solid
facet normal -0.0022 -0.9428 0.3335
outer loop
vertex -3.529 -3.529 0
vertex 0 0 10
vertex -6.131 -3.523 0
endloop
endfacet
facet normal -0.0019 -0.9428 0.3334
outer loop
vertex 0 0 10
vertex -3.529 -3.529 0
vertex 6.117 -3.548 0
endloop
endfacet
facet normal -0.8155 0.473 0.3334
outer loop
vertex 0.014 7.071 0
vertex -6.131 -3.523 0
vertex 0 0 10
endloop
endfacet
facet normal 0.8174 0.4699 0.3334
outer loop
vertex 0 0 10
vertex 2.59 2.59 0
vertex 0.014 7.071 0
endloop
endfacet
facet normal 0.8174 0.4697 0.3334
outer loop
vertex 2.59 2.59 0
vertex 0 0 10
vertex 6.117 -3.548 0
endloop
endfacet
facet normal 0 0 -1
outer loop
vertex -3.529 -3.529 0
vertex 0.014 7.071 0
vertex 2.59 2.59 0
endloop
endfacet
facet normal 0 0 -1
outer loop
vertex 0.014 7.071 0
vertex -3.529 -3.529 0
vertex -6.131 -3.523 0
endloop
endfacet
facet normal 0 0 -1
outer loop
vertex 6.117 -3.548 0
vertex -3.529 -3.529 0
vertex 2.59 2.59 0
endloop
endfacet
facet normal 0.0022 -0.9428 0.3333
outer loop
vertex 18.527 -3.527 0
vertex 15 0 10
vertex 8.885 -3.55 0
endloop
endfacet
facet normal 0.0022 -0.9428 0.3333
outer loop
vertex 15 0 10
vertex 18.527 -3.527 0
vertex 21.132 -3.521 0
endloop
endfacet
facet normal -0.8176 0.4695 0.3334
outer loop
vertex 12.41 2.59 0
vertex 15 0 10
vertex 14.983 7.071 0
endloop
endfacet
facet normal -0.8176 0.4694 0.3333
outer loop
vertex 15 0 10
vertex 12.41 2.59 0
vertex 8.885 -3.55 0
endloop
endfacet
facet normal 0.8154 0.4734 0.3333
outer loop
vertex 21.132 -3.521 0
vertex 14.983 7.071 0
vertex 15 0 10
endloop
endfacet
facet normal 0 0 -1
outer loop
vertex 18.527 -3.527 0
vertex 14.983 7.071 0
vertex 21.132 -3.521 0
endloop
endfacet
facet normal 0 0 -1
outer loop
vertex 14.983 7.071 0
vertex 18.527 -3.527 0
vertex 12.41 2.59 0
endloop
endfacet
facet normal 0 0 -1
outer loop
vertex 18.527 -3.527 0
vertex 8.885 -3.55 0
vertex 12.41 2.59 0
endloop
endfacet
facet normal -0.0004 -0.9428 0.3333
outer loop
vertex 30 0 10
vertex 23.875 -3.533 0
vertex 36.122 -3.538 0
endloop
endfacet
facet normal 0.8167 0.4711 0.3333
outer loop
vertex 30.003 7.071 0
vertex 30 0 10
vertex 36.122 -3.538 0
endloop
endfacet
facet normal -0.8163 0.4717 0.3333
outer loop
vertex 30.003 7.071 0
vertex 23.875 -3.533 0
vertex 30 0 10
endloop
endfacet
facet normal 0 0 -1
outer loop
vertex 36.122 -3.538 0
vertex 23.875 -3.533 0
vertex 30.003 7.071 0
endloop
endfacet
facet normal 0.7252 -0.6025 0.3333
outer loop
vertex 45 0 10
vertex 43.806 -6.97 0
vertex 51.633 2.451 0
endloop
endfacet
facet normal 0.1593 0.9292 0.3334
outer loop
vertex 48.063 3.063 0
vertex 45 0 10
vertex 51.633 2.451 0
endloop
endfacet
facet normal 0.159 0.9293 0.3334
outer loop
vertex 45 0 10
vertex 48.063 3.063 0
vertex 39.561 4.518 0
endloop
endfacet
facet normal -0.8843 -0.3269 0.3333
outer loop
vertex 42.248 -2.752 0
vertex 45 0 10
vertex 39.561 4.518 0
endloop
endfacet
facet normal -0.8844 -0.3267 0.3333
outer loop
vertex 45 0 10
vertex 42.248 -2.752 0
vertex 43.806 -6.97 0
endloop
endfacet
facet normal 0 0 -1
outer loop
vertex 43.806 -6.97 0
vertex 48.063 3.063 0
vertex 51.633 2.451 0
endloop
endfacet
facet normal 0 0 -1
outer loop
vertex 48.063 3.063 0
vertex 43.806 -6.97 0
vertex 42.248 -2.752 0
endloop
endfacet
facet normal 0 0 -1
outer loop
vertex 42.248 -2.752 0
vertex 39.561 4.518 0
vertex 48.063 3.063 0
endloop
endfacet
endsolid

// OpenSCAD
// file: PolyhedronOutlinerLib.scad
//====================================
// Utility functions adapted from 
// http://www.thingiverse.com/thing:11071
//====================================

function VMAG(v) = sqrt(v[0]*v[0]+v[1]*v[1]+v[2]*v[2]); 

function LineRotations(v) = [ 
	atan2(sqrt(v[0]*v[0]+v[1]*v[1]), v[2]), 
	0, 
	atan2(v[1], v[0])+90];

function parseSeg(seg) = [ 
	seg[0], 
	LineRotations(seg[1]-seg[0]), 
	VMAG(seg[1]-seg[0])
	];


module PlaceLine(seg, r=1, l = 10, type=1) 
{
	smoothness = 16;
	diameter = r*2;
	side = sqrt((diameter*diameter)/2);

	params = parseSeg(seg);

	origin = params[0];
	rot = params[1];
	len = params[2];

	translate(origin)
	rotate(rot)
	{
		if (type == 1)
		{
			rotate([0,0, 360]) cylinder(r=r, h=len, $fn=smoothness);

		} 
		if (type == 2)
		{
			translate([0,0,l/2]) cube([r,r,l], center=true);
		} 
		if (type == 3)
		{
			cube([r,r,2*l], center=true);
		}
	}
}
// main file
/* based on three.js - STL loader test by aleeper. PR2 head from www.ros.org */
  
use <PolyhedronOutlinerLib.scad>forPrint=1; generateConnectors = 1; generateSticks=0 ;sR=1.5; sL = 6; cR=30; cL=10; *edge0_1(1); *vertex0(1);if (!forPrint) %mainShape(); if (generateConnectors && forPrint) union() {translate([0,0,0]) vertex0(1);translate([15,0,0]) vertex1(1);translate([30,0,0]) vertex2(1);translate([45,0,0]) vertex3(1);}translate([0,-18,0])if (generateSticks && forPrint) union() {translate([0,0,0]) edge0_1(1);translate([3.2,0,0]) edge0_2(1);translate([6.4,0,0]) edge0_3(1);translate([9.600000000000001,0,0]) edge1_2(1);translate([12.8,0,0]) edge1_3(1);translate([16,0,0]) edge2_3(1);}module vertexBase0() { intersection() { mainShape(); PlaceLine([[-17.251,-30.062,0.00642054],[-17.657609390412986,-30.7705658206549,-0.2809850389512841]],r=cR,l=cL,type=3) {} }}module vertexBase1() { intersection() { mainShape(); PlaceLine([[-17.4484,29.9377,-0.0181856],[-17.85966446037042,30.6433406393209,-0.3061718230286469]],r=cR,l=cL,type=3) {} }}module vertexBase2() { intersection() { mainShape(); PlaceLine([[34.6114,0.108853,-0.130494],[35.4271981204083,0.11141899265250169,-0.42112632326297167]],r=cR,l=cL,type=3) {} }}module vertexBase3() { intersection() { mainShape(); PlaceLine([[0.0880366,0.0153295,48.9423],[0.09011177947309683,0.015691901394191524,49.80832155811989]],r=cR,l=cL,type=3) {} }}module edge0_1(forPrint){if (forPrint) translate([0,0,3.0642116374666877]) rotate([90,0,0]) rotate([0,0,125.12702256247589]) rotate([-90.02349712186891,0,0]) rotate([0,0,-180.18850337698703]) translate(-[-17.251,-30.062,0.00642054]){intersection() { mainShape(); union(){difference(){PlaceLine([[-17.251,-30.062,0.00642054],[-17.4484,29.9377,-0.0181856]],r=sR,l=sL,type=0) {translate([0,0,7]) linear_extrude(height=46.00002976926034) rotate([0,0,-125.12702256247589])polygon([[0,1],[1,-0.41421163746668754],[1,-3.0642116374666877],[-1,-3.0642116374666877],[-1,-0.41421163746668754]]);} vertexBase0();vertexBase1();}PlaceLine([[-17.251,-30.062,0.00642054],[-17.4484,29.9377,-0.0181856]],r=sR,l=sL,type=0) {translate([0,0,7]) linear_extrude(height=46.00002976926034) rotate([0,0,-125.12702256247589])polygon([[0,-1.6],[1,-3.014211637466688],[1,-3.0642116374666877],[-1,-3.0642116374666877],[-1,-3.014211637466688]]);} } }}if (!forPrint) {intersection() { mainShape(); union(){difference(){PlaceLine([[-17.251,-30.062,0.00642054],[-17.4484,29.9377,-0.0181856]],r=sR,l=sL,type=0) {translate([0,0,7]) linear_extrude(height=46.00002976926034) rotate([0,0,-125.12702256247589])polygon([[0,1],[1,-0.41421163746668754],[1,-3.0642116374666877],[-1,-3.0642116374666877],[-1,-0.41421163746668754]]);} vertexBase0();vertexBase1();}PlaceLine([[-17.251,-30.062,0.00642054],[-17.4484,29.9377,-0.0181856]],r=sR,l=sL,type=0) {translate([0,0,7]) linear_extrude(height=46.00002976926034) rotate([0,0,-125.12702256247589])polygon([[0,-1.6],[1,-3.014211637466688],[1,-3.0642116374666877],[-1,-3.0642116374666877],[-1,-3.014211637466688]]);} } }}}module edge0_2(forPrint){if (forPrint) translate([0,0,3.0642133753821756]) rotate([90,0,0]) rotate([0,0,-125.31274629973501]) rotate([-90.13074372948218,0,0]) rotate([0,0,-120.18862325719655]) translate(-[-17.251,-30.062,0.00642054]){intersection() { mainShape(); union(){difference(){PlaceLine([[-17.251,-30.062,0.00642054],[34.6114,0.108853,-0.130494]],r=sR,l=sL,type=0) {translate([0,0,7]) linear_extrude(height=46.000063750790076) rotate([0,0,125.31274629973501])polygon([[0,1],[1,-0.4142133753821755],[1,-3.0642133753821756],[-1,-3.0642133753821756],[-1,-0.4142133753821755]]);} vertexBase0();vertexBase2();}PlaceLine([[-17.251,-30.062,0.00642054],[34.6114,0.108853,-0.130494]],r=sR,l=sL,type=0) {translate([0,0,7]) linear_extrude(height=46.000063750790076) rotate([0,0,125.31274629973501])polygon([[0,-1.6],[1,-3.014213375382176],[1,-3.0642133753821756],[-1,-3.0642133753821756],[-1,-3.014213375382176]]);} } }}if (!forPrint) {intersection() { mainShape(); union(){difference(){PlaceLine([[-17.251,-30.062,0.00642054],[34.6114,0.108853,-0.130494]],r=sR,l=sL,type=0) {translate([0,0,7]) linear_extrude(height=46.000063750790076) rotate([0,0,125.31274629973501])polygon([[0,1],[1,-0.4142133753821755],[1,-3.0642133753821756],[-1,-3.0642133753821756],[-1,-0.4142133753821755]]);} vertexBase0();vertexBase2();}PlaceLine([[-17.251,-30.062,0.00642054],[34.6114,0.108853,-0.130494]],r=sR,l=sL,type=0) {translate([0,0,7]) linear_extrude(height=46.000063750790076) rotate([0,0,125.31274629973501])polygon([[0,-1.6],[1,-3.014213375382176],[1,-3.0642133753821756],[-1,-3.0642133753821756],[-1,-3.014213375382176]]);} } }}}module edge0_3(forPrint){if (forPrint) translate([0,0,3.0642166038497383]) rotate([90,0,0]) rotate([0,0,-0.18528390725604282]) rotate([-35.35355955063223,0,0]) rotate([0,0,-150.0373286721162]) translate(-[-17.251,-30.062,0.00642054]){intersection() { mainShape(); union(){difference(){PlaceLine([[-17.251,-30.062,0.00642054],[0.0880366,0.0153295,48.9423]],r=sR,l=sL,type=0) {translate([0,0,7]) linear_extrude(height=46.00006865488872) rotate([0,0,0.18528390725604282])polygon([[0,1],[1,-0.41421660384973813],[1,-3.0642166038497383],[-1,-3.0642166038497383],[-1,-0.41421660384973813]]);} vertexBase0();vertexBase3();}PlaceLine([[-17.251,-30.062,0.00642054],[0.0880366,0.0153295,48.9423]],r=sR,l=sL,type=0) {translate([0,0,7]) linear_extrude(height=46.00006865488872) rotate([0,0,0.18528390725604282])polygon([[0,-1.6],[1,-3.0142166038497384],[1,-3.0642166038497383],[-1,-3.0642166038497383],[-1,-3.0142166038497384]]);} } }}if (!forPrint) {intersection() { mainShape(); union(){difference(){PlaceLine([[-17.251,-30.062,0.00642054],[0.0880366,0.0153295,48.9423]],r=sR,l=sL,type=0) {translate([0,0,7]) linear_extrude(height=46.00006865488872) rotate([0,0,0.18528390725604282])polygon([[0,1],[1,-0.41421660384973813],[1,-3.0642166038497383],[-1,-3.0642166038497383],[-1,-0.41421660384973813]]);} vertexBase0();vertexBase3();}PlaceLine([[-17.251,-30.062,0.00642054],[0.0880366,0.0153295,48.9423]],r=sR,l=sL,type=0) {translate([0,0,7]) linear_extrude(height=46.00006865488872) rotate([0,0,0.18528390725604282])polygon([[0,-1.6],[1,-3.0142166038497384],[1,-3.0642166038497383],[-1,-3.0642166038497383],[-1,-3.0142166038497384]]);} } }}}module edge1_2(forPrint){if (forPrint) translate([0,0,3.0642141022553426]) rotate([90,0,0]) rotate([0,0,125.35343039899044]) rotate([-90.10724675168159,0,0]) rotate([0,0,-60.18846640455202]) translate(-[-17.4484,29.9377,-0.0181856]){intersection() { mainShape(); union(){difference(){PlaceLine([[-17.4484,29.9377,-0.0181856],[34.6114,0.108853,-0.130494]],r=sR,l=sL,type=0) {translate([0,0,7]) linear_extrude(height=45.99996252137262) rotate([0,0,-125.35343039899044])polygon([[0,1],[1,-0.4142141022553425],[1,-3.0642141022553426],[-1,-3.0642141022553426],[-1,-0.4142141022553425]]);} vertexBase1();vertexBase2();}PlaceLine([[-17.4484,29.9377,-0.0181856],[34.6114,0.108853,-0.130494]],r=sR,l=sL,type=0) {translate([0,0,7]) linear_extrude(height=45.99996252137262) rotate([0,0,-125.35343039899044])polygon([[0,-1.6],[1,-3.014214102255343],[1,-3.0642141022553426],[-1,-3.0642141022553426],[-1,-3.014214102255343]]);} } }}if (!forPrint) {intersection() { mainShape(); union(){difference(){PlaceLine([[-17.4484,29.9377,-0.0181856],[34.6114,0.108853,-0.130494]],r=sR,l=sL,type=0) {translate([0,0,7]) linear_extrude(height=45.99996252137262) rotate([0,0,-125.35343039899044])polygon([[0,1],[1,-0.4142141022553425],[1,-3.0642141022553426],[-1,-3.0642141022553426],[-1,-0.4142141022553425]]);} vertexBase1();vertexBase2();}PlaceLine([[-17.4484,29.9377,-0.0181856],[34.6114,0.108853,-0.130494]],r=sR,l=sL,type=0) {translate([0,0,7]) linear_extrude(height=45.99996252137262) rotate([0,0,-125.35343039899044])polygon([[0,-1.6],[1,-3.014214102255343],[1,-3.0642141022553426],[-1,-3.0642141022553426],[-1,-3.014214102255343]]);} } }}}module edge1_3(forPrint){if (forPrint) translate([0,0,3.064212661409589]) rotate([90,0,0]) rotate([0,0,0.22608979590030032]) rotate([-35.31288294461733,0,0]) rotate([0,0,-30.373049952173126]) translate(-[-17.4484,29.9377,-0.0181856]){intersection() { mainShape(); union(){difference(){PlaceLine([[-17.4484,29.9377,-0.0181856],[0.0880366,0.0153295,48.9423]],r=sR,l=sL,type=0) {translate([0,0,7]) linear_extrude(height=46.00003345959815) rotate([0,0,-0.22608979590030032])polygon([[0,1],[1,-0.4142126614095889],[1,-3.064212661409589],[-1,-3.064212661409589],[-1,-0.4142126614095889]]);} vertexBase1();vertexBase3();}PlaceLine([[-17.4484,29.9377,-0.0181856],[0.0880366,0.0153295,48.9423]],r=sR,l=sL,type=0) {translate([0,0,7]) linear_extrude(height=46.00003345959815) rotate([0,0,-0.22608979590030032])polygon([[0,-1.6],[1,-3.014212661409589],[1,-3.064212661409589],[-1,-3.064212661409589],[-1,-3.014212661409589]]);} } }}if (!forPrint) {intersection() { mainShape(); union(){difference(){PlaceLine([[-17.4484,29.9377,-0.0181856],[0.0880366,0.0153295,48.9423]],r=sR,l=sL,type=0) {translate([0,0,7]) linear_extrude(height=46.00003345959815) rotate([0,0,-0.22608979590030032])polygon([[0,1],[1,-0.4142126614095889],[1,-3.064212661409589],[-1,-3.064212661409589],[-1,-0.4142126614095889]]);} vertexBase1();vertexBase3();}PlaceLine([[-17.4484,29.9377,-0.0181856],[0.0880366,0.0153295,48.9423]],r=sR,l=sL,type=0) {translate([0,0,7]) linear_extrude(height=46.00003345959815) rotate([0,0,-0.22608979590030032])polygon([[0,-1.6],[1,-3.014212661409589],[1,-3.064212661409589],[-1,-3.064212661409589],[-1,-3.014212661409589]]);} } }}}module edge2_3(forPrint){if (forPrint) translate([0,0,3.0642129938815046]) rotate([90,0,0]) rotate([0,0,-0.04080870923096569]) rotate([-35.126995220167345,0,0]) rotate([0,0,89.8447865966814]) translate(-[34.6114,0.108853,-0.130494]){intersection() { mainShape(); union(){difference(){PlaceLine([[34.6114,0.108853,-0.130494],[0.0880366,0.0153295,48.9423]],r=sR,l=sL,type=0) {translate([0,0,7]) linear_extrude(height=46.0000873171027) rotate([0,0,0.04080870923096569])polygon([[0,1],[1,-0.4142129938815047],[1,-3.0642129938815046],[-1,-3.0642129938815046],[-1,-0.4142129938815047]]);} vertexBase2();vertexBase3();}PlaceLine([[34.6114,0.108853,-0.130494],[0.0880366,0.0153295,48.9423]],r=sR,l=sL,type=0) {translate([0,0,7]) linear_extrude(height=46.0000873171027) rotate([0,0,0.04080870923096569])polygon([[0,-1.6],[1,-3.0142129938815048],[1,-3.0642129938815046],[-1,-3.0642129938815046],[-1,-3.0142129938815048]]);} } }}if (!forPrint) {intersection() { mainShape(); union(){difference(){PlaceLine([[34.6114,0.108853,-0.130494],[0.0880366,0.0153295,48.9423]],r=sR,l=sL,type=0) {translate([0,0,7]) linear_extrude(height=46.0000873171027) rotate([0,0,0.04080870923096569])polygon([[0,1],[1,-0.4142129938815047],[1,-3.0642129938815046],[-1,-3.0642129938815046],[-1,-0.4142129938815047]]);} vertexBase2();vertexBase3();}PlaceLine([[34.6114,0.108853,-0.130494],[0.0880366,0.0153295,48.9423]],r=sR,l=sL,type=0) {translate([0,0,7]) linear_extrude(height=46.0000873171027) rotate([0,0,0.04080870923096569])polygon([[0,-1.6],[1,-3.0142129938815048],[1,-3.0642129938815046],[-1,-3.0642129938815046],[-1,-3.0142129938815048]]);} } }}}module vertex0(forPrint){if(forPrint) translate([0,0,cL]) rotate([-109.38217457568958,0,0]) rotate([0,0,29.849291773071826]) translate(-[-17.251,-30.062,0.00642054]) difference(){vertexBase0(); PlaceLine([[-17.251,-30.062,0.00642054],[-17.4484,29.9377,-0.0181856]],r=sR,l=sL,type=0) {translate([0,0,6]) linear_extrude(height=48.00002976926034) rotate([0,0,-125.12702256247589])minkowski() { circle(0.42, $fn=8);polygon([[0,-1.6],[1,-3.014211637466688],[1,-3.0642116374666877],[-1,-3.0642116374666877],[-1,-3.014211637466688]]);}} PlaceLine([[-17.251,-30.062,0.00642054],[34.6114,0.108853,-0.130494]],r=sR,l=sL,type=0) {translate([0,0,6]) linear_extrude(height=48.000063750790076) rotate([0,0,125.31274629973501])minkowski() { circle(0.42, $fn=8);polygon([[0,-1.6],[1,-3.014213375382176],[1,-3.0642133753821756],[-1,-3.0642133753821756],[-1,-3.014213375382176]]);}} PlaceLine([[-17.251,-30.062,0.00642054],[0.0880366,0.0153295,48.9423]],r=sR,l=sL,type=0) {translate([0,0,6]) linear_extrude(height=48.00006865488872) rotate([0,0,0.18528390725604282])minkowski() { circle(0.42, $fn=8);polygon([[0,-1.6],[1,-3.0142166038497384],[1,-3.0642166038497383],[-1,-3.0642166038497383],[-1,-3.0142166038497384]]);}} }if(!forPrint)difference(){vertexBase0(); PlaceLine([[-17.251,-30.062,0.00642054],[-17.4484,29.9377,-0.0181856]],r=sR,l=sL,type=0) {translate([0,0,6]) linear_extrude(height=48.00002976926034) rotate([0,0,-125.12702256247589])minkowski() { circle(0.42, $fn=8);polygon([[0,-1.6],[1,-3.014211637466688],[1,-3.0642116374666877],[-1,-3.0642116374666877],[-1,-3.014211637466688]]);}} PlaceLine([[-17.251,-30.062,0.00642054],[34.6114,0.108853,-0.130494]],r=sR,l=sL,type=0) {translate([0,0,6]) linear_extrude(height=48.000063750790076) rotate([0,0,125.31274629973501])minkowski() { circle(0.42, $fn=8);polygon([[0,-1.6],[1,-3.014213375382176],[1,-3.0642133753821756],[-1,-3.0642133753821756],[-1,-3.014213375382176]]);}} PlaceLine([[-17.251,-30.062,0.00642054],[0.0880366,0.0153295,48.9423]],r=sR,l=sL,type=0) {translate([0,0,6]) linear_extrude(height=48.00006865488872) rotate([0,0,0.18528390725604282])minkowski() { circle(0.42, $fn=8);polygon([[0,-1.6],[1,-3.0142166038497384],[1,-3.0642166038497383],[-1,-3.0642166038497383],[-1,-3.0142166038497384]]);}} }}module vertex1(forPrint){if(forPrint) translate([0,0,cL]) rotate([-109.42284150221329,0,0]) rotate([0,0,-210.23466847467947]) translate(-[-17.4484,29.9377,-0.0181856]) difference(){vertexBase1(); PlaceLine([[-17.4484,29.9377,-0.0181856],[34.6114,0.108853,-0.130494]],r=sR,l=sL,type=0) {translate([0,0,6]) linear_extrude(height=47.99996252137262) rotate([0,0,-125.35343039899044])minkowski() { circle(0.42, $fn=8);polygon([[0,-1.6],[1,-3.014214102255343],[1,-3.0642141022553426],[-1,-3.0642141022553426],[-1,-3.014214102255343]]);}} PlaceLine([[-17.4484,29.9377,-0.0181856],[-17.251,-30.062,0.00642054]],r=sR,l=sL,type=0) {translate([0,0,6]) linear_extrude(height=48.00002976926034) rotate([0,0,125.12702189726325])minkowski() { circle(0.42, $fn=8);polygon([[0,-1.6],[1,-3.0142116374666874],[1,-3.0642116374666872],[-1,-3.0642116374666872],[-1,-3.0142116374666874]]);}} PlaceLine([[-17.4484,29.9377,-0.0181856],[0.0880366,0.0153295,48.9423]],r=sR,l=sL,type=0) {translate([0,0,6]) linear_extrude(height=48.00003345959815) rotate([0,0,-0.22608979590030032])minkowski() { circle(0.42, $fn=8);polygon([[0,-1.6],[1,-3.014212661409589],[1,-3.064212661409589],[-1,-3.064212661409589],[-1,-3.014212661409589]]);}} }if(!forPrint)difference(){vertexBase1(); PlaceLine([[-17.4484,29.9377,-0.0181856],[34.6114,0.108853,-0.130494]],r=sR,l=sL,type=0) {translate([0,0,6]) linear_extrude(height=47.99996252137262) rotate([0,0,-125.35343039899044])minkowski() { circle(0.42, $fn=8);polygon([[0,-1.6],[1,-3.014214102255343],[1,-3.0642141022553426],[-1,-3.0642141022553426],[-1,-3.014214102255343]]);}} PlaceLine([[-17.4484,29.9377,-0.0181856],[-17.251,-30.062,0.00642054]],r=sR,l=sL,type=0) {translate([0,0,6]) linear_extrude(height=48.00002976926034) rotate([0,0,125.12702189726325])minkowski() { circle(0.42, $fn=8);polygon([[0,-1.6],[1,-3.0142116374666874],[1,-3.0642116374666872],[-1,-3.0642116374666872],[-1,-3.0142116374666874]]);}} PlaceLine([[-17.4484,29.9377,-0.0181856],[0.0880366,0.0153295,48.9423]],r=sR,l=sL,type=0) {translate([0,0,6]) linear_extrude(height=48.00003345959815) rotate([0,0,-0.22608979590030032])minkowski() { circle(0.42, $fn=8);polygon([[0,-1.6],[1,-3.014212661409589],[1,-3.064212661409589],[-1,-3.064212661409589],[-1,-3.014212661409589]]);}} }}module vertex2(forPrint){if(forPrint) translate([0,0,cL]) rotate([-109.60861610097957,0,0]) rotate([0,0,-90.18021623331887]) translate(-[34.6114,0.108853,-0.130494]) difference(){vertexBase2(); PlaceLine([[34.6114,0.108853,-0.130494],[-17.251,-30.062,0.00642054]],r=sR,l=sL,type=0) {translate([0,0,6]) linear_extrude(height=48.000063750790076) rotate([0,0,-125.31274636814837])minkowski() { circle(0.42, $fn=8);polygon([[0,-1.6],[1,-3.014213375382175],[1,-3.0642133753821748],[-1,-3.0642133753821748],[-1,-3.014213375382175]]);}} PlaceLine([[34.6114,0.108853,-0.130494],[-17.4484,29.9377,-0.0181856]],r=sR,l=sL,type=0) {translate([0,0,6]) linear_extrude(height=47.99996252137262) rotate([0,0,125.35343022480961])minkowski() { circle(0.42, $fn=8);polygon([[0,-1.6],[1,-3.014214102255343],[1,-3.0642141022553426],[-1,-3.0642141022553426],[-1,-3.014214102255343]]);}} PlaceLine([[34.6114,0.108853,-0.130494],[0.0880366,0.0153295,48.9423]],r=sR,l=sL,type=0) {translate([0,0,6]) linear_extrude(height=48.0000873171027) rotate([0,0,0.04080870923096569])minkowski() { circle(0.42, $fn=8);polygon([[0,-1.6],[1,-3.0142129938815048],[1,-3.0642129938815046],[-1,-3.0642129938815046],[-1,-3.0142129938815048]]);}} }if(!forPrint)difference(){vertexBase2(); PlaceLine([[34.6114,0.108853,-0.130494],[-17.251,-30.062,0.00642054]],r=sR,l=sL,type=0) {translate([0,0,6]) linear_extrude(height=48.000063750790076) rotate([0,0,-125.31274636814837])minkowski() { circle(0.42, $fn=8);polygon([[0,-1.6],[1,-3.014213375382175],[1,-3.0642133753821748],[-1,-3.0642133753821748],[-1,-3.014213375382175]]);}} PlaceLine([[34.6114,0.108853,-0.130494],[-17.4484,29.9377,-0.0181856]],r=sR,l=sL,type=0) {translate([0,0,6]) linear_extrude(height=47.99996252137262) rotate([0,0,125.35343022480961])minkowski() { circle(0.42, $fn=8);polygon([[0,-1.6],[1,-3.014214102255343],[1,-3.0642141022553426],[-1,-3.0642141022553426],[-1,-3.014214102255343]]);}} PlaceLine([[34.6114,0.108853,-0.130494],[0.0880366,0.0153295,48.9423]],r=sR,l=sL,type=0) {translate([0,0,6]) linear_extrude(height=48.0000873171027) rotate([0,0,0.04080870923096569])minkowski() { circle(0.42, $fn=8);polygon([[0,-1.6],[1,-3.0142129938815048],[1,-3.0642129938815046],[-1,-3.0642129938815046],[-1,-3.0142129938815048]]);}} }}module vertex3(forPrint){if(forPrint) translate([0,0,cL]) rotate([-0.13937095254312964,0,0]) rotate([0,0,-99.90601774236453]) translate(-[0.0880366,0.0153295,48.9423]) difference(){vertexBase3(); PlaceLine([[0.0880366,0.0153295,48.9423],[34.6114,0.108853,-0.130494]],r=sR,l=sL,type=0) {translate([0,0,6]) linear_extrude(height=48.0000873171027) rotate([0,0,-0.04080848853764252])minkowski() { circle(0.42, $fn=8);polygon([[0,-1.6],[1,-3.0142129938815048],[1,-3.0642129938815046],[-1,-3.0642129938815046],[-1,-3.0142129938815048]]);}} PlaceLine([[0.0880366,0.0153295,48.9423],[-17.4484,29.9377,-0.0181856]],r=sR,l=sL,type=0) {translate([0,0,6]) linear_extrude(height=48.00003345959815) rotate([0,0,0.22608936293003978])minkowski() { circle(0.42, $fn=8);polygon([[0,-1.6],[1,-3.014212661409589],[1,-3.064212661409589],[-1,-3.064212661409589],[-1,-3.014212661409589]]);}} PlaceLine([[0.0880366,0.0153295,48.9423],[-17.251,-30.062,0.00642054]],r=sR,l=sL,type=0) {translate([0,0,6]) linear_extrude(height=48.00006865488872) rotate([0,0,-0.18528267152651523])minkowski() { circle(0.42, $fn=8);polygon([[0,-1.6],[1,-3.0142166038497384],[1,-3.0642166038497383],[-1,-3.0642166038497383],[-1,-3.0142166038497384]]);}} }if(!forPrint)difference(){vertexBase3(); PlaceLine([[0.0880366,0.0153295,48.9423],[34.6114,0.108853,-0.130494]],r=sR,l=sL,type=0) {translate([0,0,6]) linear_extrude(height=48.0000873171027) rotate([0,0,-0.04080848853764252])minkowski() { circle(0.42, $fn=8);polygon([[0,-1.6],[1,-3.0142129938815048],[1,-3.0642129938815046],[-1,-3.0642129938815046],[-1,-3.0142129938815048]]);}} PlaceLine([[0.0880366,0.0153295,48.9423],[-17.4484,29.9377,-0.0181856]],r=sR,l=sL,type=0) {translate([0,0,6]) linear_extrude(height=48.00003345959815) rotate([0,0,0.22608936293003978])minkowski() { circle(0.42, $fn=8);polygon([[0,-1.6],[1,-3.014212661409589],[1,-3.064212661409589],[-1,-3.064212661409589],[-1,-3.014212661409589]]);}} PlaceLine([[0.0880366,0.0153295,48.9423],[-17.251,-30.062,0.00642054]],r=sR,l=sL,type=0) {translate([0,0,6]) linear_extrude(height=48.00006865488872) rotate([0,0,-0.18528267152651523])minkowski() { circle(0.42, $fn=8);polygon([[0,-1.6],[1,-3.0142166038497384],[1,-3.0642166038497383],[-1,-3.0642166038497383],[-1,-3.0142166038497384]]);}} }}module mainShape() {polyhedron(points = [[-17.251,-30.062,0.00642054], [-17.4484,29.9377,-0.0181856], [34.6114,0.108853,-0.130494], [0.0880366,0.0153295,48.9423]], triangles = [[0,1,2], [3,2,1], [0,3,1], [0,2,3]], convexity = 10);}
